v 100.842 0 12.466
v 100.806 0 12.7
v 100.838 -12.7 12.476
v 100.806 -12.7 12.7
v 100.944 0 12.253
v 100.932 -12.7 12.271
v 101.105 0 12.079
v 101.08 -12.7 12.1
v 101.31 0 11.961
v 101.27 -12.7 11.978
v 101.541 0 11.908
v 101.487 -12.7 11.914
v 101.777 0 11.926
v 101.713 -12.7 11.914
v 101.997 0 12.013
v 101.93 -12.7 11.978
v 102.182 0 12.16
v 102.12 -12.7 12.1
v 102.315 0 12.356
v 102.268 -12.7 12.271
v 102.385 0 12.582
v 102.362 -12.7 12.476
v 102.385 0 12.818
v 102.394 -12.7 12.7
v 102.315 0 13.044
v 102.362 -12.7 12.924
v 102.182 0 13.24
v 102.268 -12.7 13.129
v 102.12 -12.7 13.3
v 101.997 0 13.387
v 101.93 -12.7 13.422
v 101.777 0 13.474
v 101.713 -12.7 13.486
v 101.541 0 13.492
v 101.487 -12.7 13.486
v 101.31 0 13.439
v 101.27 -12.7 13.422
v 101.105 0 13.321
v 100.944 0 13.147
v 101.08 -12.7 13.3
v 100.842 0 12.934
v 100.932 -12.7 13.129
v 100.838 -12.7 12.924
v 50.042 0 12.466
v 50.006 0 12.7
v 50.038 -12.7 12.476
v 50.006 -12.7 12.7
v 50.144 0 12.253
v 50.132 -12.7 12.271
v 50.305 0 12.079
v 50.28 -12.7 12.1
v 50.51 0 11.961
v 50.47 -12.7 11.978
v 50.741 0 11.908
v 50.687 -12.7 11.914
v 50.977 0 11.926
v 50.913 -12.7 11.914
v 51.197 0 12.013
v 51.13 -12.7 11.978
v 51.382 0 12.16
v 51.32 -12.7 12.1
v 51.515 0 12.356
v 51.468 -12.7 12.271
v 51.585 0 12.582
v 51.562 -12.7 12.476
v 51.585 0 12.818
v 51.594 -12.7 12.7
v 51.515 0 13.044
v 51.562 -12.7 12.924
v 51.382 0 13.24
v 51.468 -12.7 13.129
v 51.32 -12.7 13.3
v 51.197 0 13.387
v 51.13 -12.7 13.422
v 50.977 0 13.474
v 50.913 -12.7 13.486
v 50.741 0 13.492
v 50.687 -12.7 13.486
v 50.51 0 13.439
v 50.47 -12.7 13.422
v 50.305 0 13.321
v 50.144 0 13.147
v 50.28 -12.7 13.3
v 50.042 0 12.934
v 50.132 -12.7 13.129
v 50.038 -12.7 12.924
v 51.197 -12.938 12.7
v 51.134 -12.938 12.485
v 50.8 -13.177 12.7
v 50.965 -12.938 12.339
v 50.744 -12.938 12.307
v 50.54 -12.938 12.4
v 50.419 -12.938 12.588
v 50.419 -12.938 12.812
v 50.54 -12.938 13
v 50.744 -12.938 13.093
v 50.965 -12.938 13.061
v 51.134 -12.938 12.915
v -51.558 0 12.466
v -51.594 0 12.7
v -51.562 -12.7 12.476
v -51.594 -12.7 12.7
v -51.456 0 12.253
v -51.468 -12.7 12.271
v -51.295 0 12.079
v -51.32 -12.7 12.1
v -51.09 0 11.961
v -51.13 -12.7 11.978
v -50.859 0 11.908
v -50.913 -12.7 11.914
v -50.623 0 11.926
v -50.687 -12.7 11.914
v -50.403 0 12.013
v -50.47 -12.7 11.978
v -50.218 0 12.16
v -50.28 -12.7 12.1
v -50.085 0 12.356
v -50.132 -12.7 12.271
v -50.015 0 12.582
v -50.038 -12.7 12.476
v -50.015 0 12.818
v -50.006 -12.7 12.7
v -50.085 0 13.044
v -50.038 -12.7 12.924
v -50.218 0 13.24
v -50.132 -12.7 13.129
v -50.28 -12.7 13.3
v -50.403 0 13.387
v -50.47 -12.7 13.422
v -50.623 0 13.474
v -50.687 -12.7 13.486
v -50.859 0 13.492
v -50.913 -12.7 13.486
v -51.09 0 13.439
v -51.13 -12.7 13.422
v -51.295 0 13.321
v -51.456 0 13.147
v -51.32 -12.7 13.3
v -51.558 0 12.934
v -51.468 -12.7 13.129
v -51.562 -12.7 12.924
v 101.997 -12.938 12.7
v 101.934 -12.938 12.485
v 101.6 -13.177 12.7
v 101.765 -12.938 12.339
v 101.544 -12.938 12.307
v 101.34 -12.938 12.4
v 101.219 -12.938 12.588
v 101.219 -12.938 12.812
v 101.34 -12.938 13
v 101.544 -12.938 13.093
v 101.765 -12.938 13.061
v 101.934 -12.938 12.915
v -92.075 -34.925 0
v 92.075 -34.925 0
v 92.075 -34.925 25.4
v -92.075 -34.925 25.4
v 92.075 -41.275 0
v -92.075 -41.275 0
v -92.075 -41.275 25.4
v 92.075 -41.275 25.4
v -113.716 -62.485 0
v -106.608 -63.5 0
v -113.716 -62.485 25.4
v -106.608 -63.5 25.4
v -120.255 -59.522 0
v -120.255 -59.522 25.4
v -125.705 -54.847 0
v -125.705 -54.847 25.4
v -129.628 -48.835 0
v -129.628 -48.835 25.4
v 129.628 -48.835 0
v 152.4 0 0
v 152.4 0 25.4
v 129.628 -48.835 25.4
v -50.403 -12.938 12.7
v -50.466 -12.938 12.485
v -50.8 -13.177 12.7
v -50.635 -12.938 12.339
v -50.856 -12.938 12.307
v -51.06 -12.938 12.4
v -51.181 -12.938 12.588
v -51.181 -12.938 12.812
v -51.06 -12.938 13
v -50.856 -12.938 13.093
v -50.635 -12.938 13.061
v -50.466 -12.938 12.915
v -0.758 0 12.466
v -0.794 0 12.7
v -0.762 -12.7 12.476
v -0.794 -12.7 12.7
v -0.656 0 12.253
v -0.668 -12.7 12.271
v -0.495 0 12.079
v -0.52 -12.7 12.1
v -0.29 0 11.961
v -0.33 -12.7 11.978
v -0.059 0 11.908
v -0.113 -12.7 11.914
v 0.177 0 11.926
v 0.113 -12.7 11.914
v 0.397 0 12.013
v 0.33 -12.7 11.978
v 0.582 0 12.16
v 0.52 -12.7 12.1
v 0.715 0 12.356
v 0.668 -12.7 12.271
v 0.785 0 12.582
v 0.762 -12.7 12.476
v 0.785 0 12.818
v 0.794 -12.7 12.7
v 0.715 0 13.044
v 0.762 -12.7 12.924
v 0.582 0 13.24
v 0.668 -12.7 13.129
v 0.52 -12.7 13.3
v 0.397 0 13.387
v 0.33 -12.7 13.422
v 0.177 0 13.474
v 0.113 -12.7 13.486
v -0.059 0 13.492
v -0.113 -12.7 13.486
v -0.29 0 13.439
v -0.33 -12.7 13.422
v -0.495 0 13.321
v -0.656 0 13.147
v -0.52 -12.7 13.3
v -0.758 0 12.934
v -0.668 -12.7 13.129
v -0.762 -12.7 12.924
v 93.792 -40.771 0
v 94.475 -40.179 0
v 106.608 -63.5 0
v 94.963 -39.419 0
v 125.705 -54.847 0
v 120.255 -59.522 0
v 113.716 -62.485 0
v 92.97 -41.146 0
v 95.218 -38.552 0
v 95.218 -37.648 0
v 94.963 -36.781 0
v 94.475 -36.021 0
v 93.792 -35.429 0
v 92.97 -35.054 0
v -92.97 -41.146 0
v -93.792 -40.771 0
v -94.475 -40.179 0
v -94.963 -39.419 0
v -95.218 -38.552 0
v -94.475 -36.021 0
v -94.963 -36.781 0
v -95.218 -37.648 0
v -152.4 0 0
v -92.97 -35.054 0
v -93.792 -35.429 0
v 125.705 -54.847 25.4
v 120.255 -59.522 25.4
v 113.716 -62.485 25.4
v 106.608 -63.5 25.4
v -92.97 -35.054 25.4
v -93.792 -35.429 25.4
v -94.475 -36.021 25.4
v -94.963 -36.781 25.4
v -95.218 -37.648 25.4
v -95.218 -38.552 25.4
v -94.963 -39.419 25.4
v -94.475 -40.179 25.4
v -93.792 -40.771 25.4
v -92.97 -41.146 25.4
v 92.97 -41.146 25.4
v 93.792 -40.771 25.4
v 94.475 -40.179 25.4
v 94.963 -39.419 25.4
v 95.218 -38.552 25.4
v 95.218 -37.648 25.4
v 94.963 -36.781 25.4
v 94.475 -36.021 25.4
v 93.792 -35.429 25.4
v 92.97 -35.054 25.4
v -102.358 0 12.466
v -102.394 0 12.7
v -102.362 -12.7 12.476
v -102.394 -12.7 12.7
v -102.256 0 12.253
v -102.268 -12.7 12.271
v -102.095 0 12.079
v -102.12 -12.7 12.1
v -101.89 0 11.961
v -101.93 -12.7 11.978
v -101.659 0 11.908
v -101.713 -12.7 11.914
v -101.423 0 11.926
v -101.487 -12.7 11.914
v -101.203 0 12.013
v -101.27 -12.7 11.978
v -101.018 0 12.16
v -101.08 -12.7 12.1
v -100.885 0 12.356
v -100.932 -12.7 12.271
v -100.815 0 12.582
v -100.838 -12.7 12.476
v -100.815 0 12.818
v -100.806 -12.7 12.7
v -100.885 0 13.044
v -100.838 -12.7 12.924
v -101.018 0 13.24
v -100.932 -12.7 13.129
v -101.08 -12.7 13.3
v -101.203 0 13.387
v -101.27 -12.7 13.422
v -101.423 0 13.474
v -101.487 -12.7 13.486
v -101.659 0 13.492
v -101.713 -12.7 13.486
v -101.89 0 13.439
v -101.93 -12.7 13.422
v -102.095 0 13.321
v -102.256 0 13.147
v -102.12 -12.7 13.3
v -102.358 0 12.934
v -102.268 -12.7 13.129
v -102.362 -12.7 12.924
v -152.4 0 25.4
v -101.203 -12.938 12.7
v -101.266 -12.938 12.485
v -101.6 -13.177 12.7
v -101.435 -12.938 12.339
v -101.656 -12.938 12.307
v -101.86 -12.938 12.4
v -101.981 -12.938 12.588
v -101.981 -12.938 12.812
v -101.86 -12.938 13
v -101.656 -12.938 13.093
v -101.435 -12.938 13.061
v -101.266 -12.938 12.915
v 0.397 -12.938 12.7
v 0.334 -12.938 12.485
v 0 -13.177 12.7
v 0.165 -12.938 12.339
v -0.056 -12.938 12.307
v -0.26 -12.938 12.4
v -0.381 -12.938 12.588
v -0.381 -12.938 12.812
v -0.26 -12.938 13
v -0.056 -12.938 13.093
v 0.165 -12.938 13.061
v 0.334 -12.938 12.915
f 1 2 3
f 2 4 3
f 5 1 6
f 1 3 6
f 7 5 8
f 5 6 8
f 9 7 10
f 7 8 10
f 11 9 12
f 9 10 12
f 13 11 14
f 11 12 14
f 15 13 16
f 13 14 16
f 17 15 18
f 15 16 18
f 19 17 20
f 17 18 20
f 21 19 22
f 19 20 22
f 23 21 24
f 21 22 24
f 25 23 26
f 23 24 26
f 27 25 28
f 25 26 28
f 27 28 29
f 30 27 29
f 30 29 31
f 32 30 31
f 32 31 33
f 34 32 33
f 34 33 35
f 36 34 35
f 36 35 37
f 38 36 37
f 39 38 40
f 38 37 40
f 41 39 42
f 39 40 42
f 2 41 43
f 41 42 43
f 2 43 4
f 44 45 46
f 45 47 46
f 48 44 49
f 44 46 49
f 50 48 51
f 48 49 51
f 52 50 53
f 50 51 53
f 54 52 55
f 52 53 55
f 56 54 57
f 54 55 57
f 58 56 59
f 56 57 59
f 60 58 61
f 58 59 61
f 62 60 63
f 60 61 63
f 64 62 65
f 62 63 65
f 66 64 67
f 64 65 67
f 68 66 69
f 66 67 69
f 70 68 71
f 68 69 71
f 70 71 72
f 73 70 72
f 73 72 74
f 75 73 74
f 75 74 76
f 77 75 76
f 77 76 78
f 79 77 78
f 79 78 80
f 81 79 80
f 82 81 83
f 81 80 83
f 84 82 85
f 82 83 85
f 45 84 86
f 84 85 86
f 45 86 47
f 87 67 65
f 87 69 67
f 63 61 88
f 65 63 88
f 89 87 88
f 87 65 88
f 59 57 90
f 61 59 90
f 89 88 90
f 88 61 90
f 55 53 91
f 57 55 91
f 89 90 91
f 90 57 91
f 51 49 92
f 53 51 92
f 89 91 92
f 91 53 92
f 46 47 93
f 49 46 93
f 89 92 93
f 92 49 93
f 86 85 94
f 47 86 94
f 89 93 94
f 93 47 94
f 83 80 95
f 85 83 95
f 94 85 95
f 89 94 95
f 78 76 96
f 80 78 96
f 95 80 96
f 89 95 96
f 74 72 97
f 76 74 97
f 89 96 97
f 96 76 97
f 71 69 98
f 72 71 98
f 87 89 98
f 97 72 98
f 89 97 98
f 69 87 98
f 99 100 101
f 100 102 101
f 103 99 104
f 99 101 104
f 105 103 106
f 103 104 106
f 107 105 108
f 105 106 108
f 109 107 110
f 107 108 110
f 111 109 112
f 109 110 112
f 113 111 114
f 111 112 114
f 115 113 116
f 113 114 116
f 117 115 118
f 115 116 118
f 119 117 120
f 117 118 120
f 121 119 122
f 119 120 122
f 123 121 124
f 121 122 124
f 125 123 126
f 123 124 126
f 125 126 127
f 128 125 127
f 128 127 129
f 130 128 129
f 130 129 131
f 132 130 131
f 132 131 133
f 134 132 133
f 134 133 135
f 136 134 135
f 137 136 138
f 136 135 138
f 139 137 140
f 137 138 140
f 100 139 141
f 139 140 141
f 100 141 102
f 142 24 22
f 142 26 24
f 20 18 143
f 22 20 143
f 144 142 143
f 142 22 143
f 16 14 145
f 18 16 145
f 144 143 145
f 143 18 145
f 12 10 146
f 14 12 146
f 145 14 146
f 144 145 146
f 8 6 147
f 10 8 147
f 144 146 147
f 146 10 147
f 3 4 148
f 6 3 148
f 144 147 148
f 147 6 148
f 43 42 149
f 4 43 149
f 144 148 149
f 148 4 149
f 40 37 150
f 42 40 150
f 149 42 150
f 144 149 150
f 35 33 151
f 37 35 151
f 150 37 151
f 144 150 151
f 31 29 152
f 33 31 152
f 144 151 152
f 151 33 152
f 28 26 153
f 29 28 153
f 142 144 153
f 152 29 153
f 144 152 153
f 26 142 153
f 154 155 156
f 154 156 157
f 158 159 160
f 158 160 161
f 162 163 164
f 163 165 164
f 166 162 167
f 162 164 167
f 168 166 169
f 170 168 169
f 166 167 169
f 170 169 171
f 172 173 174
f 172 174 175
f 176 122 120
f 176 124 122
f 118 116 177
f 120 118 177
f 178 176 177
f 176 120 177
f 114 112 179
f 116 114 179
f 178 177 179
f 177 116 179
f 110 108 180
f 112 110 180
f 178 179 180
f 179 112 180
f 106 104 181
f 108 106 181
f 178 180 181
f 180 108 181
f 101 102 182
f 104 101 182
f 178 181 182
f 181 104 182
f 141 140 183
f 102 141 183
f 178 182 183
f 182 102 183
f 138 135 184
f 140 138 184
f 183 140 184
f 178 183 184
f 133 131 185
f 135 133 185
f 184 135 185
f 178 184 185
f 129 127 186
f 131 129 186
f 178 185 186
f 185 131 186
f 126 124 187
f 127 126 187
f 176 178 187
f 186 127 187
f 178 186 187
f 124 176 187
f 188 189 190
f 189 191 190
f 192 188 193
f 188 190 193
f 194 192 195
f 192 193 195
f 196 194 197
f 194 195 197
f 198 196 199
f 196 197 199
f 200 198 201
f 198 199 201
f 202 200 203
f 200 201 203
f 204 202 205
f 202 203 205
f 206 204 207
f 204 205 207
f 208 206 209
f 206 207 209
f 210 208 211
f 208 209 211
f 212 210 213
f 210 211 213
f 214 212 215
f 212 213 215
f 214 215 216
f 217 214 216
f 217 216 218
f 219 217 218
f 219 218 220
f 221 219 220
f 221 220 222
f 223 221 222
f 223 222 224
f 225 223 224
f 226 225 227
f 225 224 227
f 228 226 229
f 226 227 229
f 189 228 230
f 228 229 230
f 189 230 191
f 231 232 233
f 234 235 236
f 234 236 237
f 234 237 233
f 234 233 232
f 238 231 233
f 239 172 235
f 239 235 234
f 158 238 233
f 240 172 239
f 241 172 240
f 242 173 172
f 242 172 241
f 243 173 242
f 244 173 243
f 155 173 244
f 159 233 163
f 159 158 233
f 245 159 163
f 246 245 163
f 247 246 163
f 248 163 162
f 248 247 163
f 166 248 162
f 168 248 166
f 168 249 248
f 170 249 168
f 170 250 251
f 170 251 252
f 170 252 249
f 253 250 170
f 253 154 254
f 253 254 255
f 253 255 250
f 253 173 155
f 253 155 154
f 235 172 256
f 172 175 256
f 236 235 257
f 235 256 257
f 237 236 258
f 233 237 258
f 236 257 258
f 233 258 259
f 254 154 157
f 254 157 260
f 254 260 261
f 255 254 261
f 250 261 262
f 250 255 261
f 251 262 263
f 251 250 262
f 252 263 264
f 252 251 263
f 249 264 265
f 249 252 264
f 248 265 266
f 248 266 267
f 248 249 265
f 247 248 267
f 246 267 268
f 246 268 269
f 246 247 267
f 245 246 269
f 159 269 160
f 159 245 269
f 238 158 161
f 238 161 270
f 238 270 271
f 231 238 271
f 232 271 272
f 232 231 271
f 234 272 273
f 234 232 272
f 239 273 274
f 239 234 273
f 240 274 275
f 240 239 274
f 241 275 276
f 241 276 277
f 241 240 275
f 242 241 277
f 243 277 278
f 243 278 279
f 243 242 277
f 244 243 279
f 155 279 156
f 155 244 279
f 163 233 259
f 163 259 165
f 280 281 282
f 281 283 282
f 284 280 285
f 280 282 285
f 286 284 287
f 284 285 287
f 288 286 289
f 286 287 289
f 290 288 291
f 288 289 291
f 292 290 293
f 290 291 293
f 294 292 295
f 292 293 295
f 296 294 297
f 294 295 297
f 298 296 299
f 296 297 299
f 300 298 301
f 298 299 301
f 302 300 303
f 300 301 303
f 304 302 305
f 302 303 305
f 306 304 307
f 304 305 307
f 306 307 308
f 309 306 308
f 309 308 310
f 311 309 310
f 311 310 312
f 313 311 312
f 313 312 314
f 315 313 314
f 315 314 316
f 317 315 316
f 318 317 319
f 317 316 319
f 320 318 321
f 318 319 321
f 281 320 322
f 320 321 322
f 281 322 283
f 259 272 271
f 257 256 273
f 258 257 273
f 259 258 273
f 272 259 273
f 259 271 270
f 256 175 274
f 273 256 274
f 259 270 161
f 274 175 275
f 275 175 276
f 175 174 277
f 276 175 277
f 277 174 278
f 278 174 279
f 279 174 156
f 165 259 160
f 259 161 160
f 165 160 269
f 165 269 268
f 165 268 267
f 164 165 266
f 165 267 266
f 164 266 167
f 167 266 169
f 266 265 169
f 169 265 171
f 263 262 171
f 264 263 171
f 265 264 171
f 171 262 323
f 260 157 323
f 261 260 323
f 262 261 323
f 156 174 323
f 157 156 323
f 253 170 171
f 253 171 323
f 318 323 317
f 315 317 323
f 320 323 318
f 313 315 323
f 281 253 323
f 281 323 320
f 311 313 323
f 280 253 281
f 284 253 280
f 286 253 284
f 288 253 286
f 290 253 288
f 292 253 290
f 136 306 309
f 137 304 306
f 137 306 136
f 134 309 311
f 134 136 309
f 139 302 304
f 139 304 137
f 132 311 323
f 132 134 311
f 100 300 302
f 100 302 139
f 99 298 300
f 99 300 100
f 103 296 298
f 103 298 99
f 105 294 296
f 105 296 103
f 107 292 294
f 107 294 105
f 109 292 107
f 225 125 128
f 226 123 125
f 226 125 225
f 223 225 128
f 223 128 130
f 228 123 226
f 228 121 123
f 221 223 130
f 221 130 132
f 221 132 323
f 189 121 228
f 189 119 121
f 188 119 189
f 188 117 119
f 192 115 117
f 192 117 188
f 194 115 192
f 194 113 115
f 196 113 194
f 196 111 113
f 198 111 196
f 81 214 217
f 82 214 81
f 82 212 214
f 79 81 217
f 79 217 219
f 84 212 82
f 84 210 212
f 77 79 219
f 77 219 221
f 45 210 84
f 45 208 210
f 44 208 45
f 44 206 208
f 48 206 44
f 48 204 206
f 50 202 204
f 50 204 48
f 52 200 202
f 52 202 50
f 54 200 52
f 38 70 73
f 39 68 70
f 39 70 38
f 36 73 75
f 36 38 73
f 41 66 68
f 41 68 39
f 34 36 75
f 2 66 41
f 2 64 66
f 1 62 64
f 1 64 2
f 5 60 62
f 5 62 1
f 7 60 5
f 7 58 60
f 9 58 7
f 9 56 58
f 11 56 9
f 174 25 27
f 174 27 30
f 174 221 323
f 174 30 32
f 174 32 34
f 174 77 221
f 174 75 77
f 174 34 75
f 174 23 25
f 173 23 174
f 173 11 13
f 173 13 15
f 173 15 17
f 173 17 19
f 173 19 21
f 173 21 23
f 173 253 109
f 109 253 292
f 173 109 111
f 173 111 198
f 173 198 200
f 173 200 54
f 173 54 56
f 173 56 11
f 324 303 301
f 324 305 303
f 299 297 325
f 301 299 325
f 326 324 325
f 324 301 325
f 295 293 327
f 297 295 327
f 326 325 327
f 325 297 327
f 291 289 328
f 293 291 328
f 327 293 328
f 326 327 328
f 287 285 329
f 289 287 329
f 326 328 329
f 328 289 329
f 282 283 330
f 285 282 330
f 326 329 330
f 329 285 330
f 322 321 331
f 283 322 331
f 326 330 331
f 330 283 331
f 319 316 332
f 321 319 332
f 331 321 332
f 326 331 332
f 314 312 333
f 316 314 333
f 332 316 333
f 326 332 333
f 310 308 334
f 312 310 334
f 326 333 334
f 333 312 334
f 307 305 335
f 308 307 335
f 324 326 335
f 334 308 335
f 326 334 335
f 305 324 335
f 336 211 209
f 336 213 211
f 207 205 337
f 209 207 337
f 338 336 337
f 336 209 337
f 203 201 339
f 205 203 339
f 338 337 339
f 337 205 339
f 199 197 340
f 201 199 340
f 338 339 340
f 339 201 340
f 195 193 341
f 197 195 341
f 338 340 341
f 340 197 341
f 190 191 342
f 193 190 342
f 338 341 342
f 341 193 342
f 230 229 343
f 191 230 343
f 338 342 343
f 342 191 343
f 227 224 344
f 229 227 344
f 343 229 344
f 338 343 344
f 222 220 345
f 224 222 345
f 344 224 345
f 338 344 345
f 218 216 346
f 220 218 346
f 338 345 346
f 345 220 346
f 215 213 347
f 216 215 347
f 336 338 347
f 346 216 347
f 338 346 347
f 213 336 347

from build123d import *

# Parameters (mm, degrees)
BOSS_EXTRUDE1_DEPTH                = 25.4
FILLET1_R                          = 25.4
F_1_4_0_25_DIAMETER_SLOT1_DEPTH    = 25.4
F_1_16_0_0625_DIAMETER_HOLE1_D     = 1.5875
F_1_16_0_0625_DIAMETER_HOLE1_DEPTH = 12.7
F_1_16_0_0625_DIAMETER_HOLE1_TIP   = 0.476933116


# Read off the part's stored shape, not the designer's step: 1/4 (0.25) Diameter Slot1
with BuildPart() as part:
    # Sketch1 → Boss-Extrude1 (new body)
    with BuildSketch(Plane.XY):
        Polygon((-152.4, 0), (152.4, 0), (122.789463707, -63.5), (-122.789463707, -63.5), align=None)
    extrude(amount=BOSS_EXTRUDE1_DEPTH)

    # Fillet1
    fillet1_edges = [part.edges().sort_by_distance(p)[0] for p in [
        (122.789463707, -63.5, 12.7),
        (-122.789463707, -63.5, 12.7),
    ]]
    fillet(fillet1_edges, radius=FILLET1_R)

    # 1/4 (0.25) Diameter Slot1 outline → 1/4 (0.25) Diameter Slot1 (cut)
    with BuildSketch(Plane.XY):
        with BuildLine():
            Line((-92.075, -41.275), (92.075, -41.275))
            ThreePointArc((92.075, -41.275), (95.25, -38.1), (92.075, -34.925))
            Line((92.075, -34.925), (-92.075, -34.925))
            ThreePointArc((-92.075, -34.925), (-95.25, -38.1), (-92.075, -41.275))
        make_face()
    extrude(amount=F_1_4_0_25_DIAMETER_SLOT1_DEPTH, mode=Mode.SUBTRACT)

    # 1/16 (0.0625) Diameter Hole1
    with Locations(Plane(origin=(0, 0, 0), x_dir=(1, 0, 0), z_dir=(0, 1, 0))):
        with Locations((-101.6, -12.7), (-50.8, -12.7), (0, -12.7), (50.8, -12.7), (101.6, -12.7)):
            Hole(F_1_16_0_0625_DIAMETER_HOLE1_D / 2, depth=F_1_16_0_0625_DIAMETER_HOLE1_DEPTH)
            with Locations((0, 0, -(F_1_16_0_0625_DIAMETER_HOLE1_DEPTH + F_1_16_0_0625_DIAMETER_HOLE1_TIP / 2))):  # 118° drill point
                Cone(0, F_1_16_0_0625_DIAMETER_HOLE1_D / 2, F_1_16_0_0625_DIAMETER_HOLE1_TIP, mode=Mode.SUBTRACT)


solid = part.part
